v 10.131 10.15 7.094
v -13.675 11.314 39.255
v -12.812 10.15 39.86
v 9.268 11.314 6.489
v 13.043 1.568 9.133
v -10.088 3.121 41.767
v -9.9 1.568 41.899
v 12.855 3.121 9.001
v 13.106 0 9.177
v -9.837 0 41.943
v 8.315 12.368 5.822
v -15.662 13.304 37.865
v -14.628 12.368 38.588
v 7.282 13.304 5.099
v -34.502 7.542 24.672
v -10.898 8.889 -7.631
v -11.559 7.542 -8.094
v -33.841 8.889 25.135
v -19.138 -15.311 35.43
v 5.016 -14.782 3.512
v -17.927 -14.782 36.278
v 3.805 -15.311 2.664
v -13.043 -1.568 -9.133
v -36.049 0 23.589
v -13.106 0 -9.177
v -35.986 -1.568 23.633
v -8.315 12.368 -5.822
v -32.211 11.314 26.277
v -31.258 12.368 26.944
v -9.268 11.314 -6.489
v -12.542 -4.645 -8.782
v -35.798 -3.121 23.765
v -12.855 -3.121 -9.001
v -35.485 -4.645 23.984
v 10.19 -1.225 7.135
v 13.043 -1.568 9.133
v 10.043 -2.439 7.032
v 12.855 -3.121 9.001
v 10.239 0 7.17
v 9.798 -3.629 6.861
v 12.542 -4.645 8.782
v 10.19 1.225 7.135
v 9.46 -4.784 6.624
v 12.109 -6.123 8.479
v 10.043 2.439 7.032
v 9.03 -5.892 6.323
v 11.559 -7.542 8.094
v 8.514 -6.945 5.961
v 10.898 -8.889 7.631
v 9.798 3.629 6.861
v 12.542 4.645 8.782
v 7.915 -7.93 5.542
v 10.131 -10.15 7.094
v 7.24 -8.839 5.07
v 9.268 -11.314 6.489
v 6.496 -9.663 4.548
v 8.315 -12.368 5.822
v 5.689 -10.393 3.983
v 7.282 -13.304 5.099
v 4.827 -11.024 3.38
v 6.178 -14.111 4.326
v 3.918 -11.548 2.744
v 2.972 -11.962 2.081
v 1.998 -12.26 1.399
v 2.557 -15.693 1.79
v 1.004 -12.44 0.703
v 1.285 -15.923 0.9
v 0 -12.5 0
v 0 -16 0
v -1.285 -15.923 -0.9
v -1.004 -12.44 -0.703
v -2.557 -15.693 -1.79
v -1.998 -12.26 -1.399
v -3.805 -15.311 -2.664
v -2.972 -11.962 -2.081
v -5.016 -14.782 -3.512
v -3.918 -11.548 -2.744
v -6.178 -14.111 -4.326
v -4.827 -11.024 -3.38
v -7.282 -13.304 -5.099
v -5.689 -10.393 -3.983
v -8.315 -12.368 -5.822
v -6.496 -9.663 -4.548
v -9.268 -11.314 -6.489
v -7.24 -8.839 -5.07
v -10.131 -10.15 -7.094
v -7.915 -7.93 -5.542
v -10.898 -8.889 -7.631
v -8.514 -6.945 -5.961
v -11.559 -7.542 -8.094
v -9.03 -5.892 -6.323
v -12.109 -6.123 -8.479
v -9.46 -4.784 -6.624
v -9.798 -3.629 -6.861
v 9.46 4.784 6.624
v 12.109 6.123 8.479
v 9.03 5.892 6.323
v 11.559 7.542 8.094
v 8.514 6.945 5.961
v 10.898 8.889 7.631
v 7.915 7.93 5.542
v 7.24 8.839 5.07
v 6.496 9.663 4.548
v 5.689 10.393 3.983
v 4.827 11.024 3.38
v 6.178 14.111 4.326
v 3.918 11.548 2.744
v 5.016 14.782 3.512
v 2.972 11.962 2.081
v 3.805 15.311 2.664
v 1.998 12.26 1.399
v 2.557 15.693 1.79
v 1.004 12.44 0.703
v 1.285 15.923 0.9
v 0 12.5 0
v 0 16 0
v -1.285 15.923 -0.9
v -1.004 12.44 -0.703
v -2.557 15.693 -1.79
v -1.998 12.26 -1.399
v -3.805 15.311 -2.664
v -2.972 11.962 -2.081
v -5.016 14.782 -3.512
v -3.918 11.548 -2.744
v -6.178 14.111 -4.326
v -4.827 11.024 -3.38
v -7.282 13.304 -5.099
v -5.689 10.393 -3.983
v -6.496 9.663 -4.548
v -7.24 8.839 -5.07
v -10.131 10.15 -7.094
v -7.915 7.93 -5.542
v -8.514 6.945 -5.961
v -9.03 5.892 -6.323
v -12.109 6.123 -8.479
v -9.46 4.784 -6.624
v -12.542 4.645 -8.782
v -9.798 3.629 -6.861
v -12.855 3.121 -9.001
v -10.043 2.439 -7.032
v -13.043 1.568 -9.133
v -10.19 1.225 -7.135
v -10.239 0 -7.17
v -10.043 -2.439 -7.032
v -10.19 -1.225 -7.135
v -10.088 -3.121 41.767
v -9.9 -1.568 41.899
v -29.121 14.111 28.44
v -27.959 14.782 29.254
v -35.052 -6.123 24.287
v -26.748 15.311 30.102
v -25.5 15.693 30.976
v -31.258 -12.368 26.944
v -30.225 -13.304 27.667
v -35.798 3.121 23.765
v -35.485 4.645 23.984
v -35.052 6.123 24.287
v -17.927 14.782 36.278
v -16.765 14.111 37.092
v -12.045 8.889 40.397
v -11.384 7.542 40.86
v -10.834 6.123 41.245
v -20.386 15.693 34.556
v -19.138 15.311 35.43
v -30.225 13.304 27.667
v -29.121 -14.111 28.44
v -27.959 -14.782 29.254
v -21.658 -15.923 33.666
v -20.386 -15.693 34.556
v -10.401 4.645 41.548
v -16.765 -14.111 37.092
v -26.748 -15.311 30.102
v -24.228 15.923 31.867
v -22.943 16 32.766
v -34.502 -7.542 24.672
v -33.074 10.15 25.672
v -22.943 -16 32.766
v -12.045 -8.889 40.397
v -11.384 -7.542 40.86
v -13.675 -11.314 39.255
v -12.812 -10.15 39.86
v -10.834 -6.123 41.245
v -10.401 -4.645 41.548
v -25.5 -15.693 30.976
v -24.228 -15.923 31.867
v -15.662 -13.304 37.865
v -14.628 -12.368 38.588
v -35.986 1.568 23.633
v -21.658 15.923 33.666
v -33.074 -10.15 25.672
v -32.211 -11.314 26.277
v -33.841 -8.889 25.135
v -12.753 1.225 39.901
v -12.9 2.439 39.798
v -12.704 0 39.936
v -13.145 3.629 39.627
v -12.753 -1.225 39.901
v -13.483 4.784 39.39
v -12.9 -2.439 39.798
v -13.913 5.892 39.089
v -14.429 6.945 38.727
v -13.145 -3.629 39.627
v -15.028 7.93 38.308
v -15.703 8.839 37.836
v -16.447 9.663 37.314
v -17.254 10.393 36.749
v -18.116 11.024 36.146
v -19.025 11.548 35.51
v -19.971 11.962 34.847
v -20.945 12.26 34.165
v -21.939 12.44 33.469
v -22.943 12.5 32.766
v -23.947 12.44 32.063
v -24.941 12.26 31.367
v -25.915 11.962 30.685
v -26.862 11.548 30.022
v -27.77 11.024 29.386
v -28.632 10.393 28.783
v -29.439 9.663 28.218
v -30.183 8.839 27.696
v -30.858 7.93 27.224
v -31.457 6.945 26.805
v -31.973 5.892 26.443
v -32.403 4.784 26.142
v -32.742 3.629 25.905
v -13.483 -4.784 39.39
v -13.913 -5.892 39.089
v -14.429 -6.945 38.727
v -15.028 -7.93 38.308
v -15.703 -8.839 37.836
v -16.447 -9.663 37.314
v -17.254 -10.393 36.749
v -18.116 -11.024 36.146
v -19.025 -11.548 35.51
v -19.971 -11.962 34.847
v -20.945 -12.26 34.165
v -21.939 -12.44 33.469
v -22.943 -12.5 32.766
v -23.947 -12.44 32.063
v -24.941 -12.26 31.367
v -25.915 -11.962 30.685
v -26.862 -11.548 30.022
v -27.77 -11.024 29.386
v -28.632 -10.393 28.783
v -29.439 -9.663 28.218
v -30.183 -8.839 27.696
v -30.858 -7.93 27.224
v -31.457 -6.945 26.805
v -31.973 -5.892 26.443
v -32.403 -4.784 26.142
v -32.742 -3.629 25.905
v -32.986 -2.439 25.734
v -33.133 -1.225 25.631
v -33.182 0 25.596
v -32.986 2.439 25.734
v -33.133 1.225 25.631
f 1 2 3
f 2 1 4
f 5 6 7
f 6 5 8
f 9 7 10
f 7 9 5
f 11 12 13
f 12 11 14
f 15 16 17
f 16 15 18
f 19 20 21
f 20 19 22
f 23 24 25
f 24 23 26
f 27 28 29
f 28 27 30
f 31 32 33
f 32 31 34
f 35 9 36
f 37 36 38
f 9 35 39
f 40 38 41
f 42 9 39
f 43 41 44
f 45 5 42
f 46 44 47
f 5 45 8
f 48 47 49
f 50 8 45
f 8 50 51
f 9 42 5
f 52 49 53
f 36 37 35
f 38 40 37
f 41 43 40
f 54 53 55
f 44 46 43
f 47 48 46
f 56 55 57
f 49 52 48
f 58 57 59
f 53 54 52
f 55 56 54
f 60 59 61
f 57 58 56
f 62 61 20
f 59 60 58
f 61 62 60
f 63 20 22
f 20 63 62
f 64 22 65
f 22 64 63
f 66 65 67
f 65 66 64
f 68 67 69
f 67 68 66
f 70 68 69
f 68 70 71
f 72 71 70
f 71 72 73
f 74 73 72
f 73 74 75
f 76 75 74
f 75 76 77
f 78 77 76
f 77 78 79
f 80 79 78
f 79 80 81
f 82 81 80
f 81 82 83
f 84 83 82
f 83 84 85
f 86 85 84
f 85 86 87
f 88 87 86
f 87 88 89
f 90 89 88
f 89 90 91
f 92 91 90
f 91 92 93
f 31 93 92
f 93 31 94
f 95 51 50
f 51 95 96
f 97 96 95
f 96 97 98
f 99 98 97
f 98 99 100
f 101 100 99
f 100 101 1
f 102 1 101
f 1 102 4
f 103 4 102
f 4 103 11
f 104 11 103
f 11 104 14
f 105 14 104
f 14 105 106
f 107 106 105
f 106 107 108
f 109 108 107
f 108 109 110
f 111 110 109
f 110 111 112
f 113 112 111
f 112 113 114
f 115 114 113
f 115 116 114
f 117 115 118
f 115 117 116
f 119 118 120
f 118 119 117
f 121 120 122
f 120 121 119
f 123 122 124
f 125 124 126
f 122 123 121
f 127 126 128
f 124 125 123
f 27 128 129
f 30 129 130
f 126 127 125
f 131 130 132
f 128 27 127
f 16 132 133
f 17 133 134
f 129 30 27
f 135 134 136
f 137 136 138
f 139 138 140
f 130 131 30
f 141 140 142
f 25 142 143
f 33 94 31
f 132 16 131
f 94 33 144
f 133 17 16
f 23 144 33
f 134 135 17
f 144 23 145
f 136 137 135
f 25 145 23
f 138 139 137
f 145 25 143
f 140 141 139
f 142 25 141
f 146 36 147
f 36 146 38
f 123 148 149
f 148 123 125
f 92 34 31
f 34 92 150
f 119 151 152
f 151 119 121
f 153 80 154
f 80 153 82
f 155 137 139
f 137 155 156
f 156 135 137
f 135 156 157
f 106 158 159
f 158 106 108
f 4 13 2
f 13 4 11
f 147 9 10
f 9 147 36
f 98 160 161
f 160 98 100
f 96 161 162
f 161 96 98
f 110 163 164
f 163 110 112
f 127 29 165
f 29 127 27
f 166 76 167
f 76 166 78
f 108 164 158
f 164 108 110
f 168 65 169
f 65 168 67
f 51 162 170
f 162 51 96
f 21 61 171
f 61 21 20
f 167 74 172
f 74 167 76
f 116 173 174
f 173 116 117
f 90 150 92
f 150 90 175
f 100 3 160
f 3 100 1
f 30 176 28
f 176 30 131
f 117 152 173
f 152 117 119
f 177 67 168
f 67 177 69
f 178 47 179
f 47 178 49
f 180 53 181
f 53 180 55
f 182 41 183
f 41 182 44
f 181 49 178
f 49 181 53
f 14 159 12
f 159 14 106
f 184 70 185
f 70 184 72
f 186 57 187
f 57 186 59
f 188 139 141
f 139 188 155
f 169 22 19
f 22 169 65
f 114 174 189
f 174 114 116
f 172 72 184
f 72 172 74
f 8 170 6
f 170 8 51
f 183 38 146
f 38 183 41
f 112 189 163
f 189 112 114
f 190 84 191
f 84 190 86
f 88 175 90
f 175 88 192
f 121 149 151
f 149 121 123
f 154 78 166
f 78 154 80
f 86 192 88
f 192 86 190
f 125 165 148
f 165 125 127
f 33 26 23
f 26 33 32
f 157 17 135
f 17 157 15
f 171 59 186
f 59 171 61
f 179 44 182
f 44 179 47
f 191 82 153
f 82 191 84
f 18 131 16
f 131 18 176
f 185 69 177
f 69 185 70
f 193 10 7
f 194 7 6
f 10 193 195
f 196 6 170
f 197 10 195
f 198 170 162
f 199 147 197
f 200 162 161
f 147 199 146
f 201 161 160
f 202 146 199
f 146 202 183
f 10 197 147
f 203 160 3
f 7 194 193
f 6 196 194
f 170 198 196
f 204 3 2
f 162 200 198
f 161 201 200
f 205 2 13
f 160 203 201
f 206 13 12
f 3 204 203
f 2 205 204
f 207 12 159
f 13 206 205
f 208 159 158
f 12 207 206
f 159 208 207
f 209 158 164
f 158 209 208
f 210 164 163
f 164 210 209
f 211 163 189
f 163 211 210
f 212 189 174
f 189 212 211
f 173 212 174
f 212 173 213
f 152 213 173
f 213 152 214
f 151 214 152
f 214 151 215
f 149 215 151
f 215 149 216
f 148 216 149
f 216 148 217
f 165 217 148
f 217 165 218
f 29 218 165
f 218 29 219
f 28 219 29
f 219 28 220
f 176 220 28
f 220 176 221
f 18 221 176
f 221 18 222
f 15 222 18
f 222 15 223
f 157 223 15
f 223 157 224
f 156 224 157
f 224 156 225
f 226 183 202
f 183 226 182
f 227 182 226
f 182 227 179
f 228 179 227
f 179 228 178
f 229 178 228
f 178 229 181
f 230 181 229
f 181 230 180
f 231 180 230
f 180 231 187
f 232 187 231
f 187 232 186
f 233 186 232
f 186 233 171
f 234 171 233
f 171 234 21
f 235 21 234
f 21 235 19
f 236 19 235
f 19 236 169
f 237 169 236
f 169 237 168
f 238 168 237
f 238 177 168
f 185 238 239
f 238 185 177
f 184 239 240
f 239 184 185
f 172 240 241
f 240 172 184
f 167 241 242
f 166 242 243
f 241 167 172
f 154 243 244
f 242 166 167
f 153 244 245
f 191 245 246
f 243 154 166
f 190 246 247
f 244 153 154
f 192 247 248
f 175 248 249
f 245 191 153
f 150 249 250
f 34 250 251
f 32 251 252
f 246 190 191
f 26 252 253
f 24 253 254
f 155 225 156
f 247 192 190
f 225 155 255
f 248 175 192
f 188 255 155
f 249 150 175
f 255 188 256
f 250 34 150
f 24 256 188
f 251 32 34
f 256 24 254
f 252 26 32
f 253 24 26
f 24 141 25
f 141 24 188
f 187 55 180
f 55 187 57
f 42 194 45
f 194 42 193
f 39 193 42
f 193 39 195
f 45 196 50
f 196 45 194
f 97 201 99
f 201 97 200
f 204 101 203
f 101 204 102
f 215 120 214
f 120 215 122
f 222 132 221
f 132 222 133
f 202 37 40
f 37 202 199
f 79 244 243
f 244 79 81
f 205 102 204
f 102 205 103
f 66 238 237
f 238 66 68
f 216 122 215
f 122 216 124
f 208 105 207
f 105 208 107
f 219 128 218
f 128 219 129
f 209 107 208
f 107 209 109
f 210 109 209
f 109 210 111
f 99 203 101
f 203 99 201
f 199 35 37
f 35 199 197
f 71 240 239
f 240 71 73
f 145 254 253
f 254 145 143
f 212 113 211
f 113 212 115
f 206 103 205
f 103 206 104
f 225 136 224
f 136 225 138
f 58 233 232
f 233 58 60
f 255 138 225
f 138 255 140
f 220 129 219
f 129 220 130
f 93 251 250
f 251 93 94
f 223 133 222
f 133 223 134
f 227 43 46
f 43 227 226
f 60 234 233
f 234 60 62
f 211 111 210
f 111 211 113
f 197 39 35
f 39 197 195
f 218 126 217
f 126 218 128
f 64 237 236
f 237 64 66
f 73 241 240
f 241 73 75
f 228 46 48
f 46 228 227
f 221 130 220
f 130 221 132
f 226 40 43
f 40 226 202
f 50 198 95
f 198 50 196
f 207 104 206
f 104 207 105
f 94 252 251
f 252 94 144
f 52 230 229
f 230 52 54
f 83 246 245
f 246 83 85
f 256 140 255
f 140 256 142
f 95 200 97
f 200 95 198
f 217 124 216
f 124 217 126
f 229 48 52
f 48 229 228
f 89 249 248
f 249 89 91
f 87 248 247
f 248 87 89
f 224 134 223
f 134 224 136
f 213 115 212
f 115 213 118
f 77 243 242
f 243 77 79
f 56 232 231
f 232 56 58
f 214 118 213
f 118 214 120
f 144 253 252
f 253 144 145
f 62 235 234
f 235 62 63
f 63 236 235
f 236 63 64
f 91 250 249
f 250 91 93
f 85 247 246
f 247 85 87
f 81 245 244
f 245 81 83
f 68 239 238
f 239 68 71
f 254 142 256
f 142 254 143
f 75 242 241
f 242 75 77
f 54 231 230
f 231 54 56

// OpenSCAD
od=32; id=25; h=40; angle=-35;
module port(){ difference(){ cylinder(h=h,r=od/2,$fn=64); translate([0,0,0]) cylinder(h=h+2,r=id/2,$fn=64); } }
translate([0,0,0]) rotate([0,angle,0]) port();
